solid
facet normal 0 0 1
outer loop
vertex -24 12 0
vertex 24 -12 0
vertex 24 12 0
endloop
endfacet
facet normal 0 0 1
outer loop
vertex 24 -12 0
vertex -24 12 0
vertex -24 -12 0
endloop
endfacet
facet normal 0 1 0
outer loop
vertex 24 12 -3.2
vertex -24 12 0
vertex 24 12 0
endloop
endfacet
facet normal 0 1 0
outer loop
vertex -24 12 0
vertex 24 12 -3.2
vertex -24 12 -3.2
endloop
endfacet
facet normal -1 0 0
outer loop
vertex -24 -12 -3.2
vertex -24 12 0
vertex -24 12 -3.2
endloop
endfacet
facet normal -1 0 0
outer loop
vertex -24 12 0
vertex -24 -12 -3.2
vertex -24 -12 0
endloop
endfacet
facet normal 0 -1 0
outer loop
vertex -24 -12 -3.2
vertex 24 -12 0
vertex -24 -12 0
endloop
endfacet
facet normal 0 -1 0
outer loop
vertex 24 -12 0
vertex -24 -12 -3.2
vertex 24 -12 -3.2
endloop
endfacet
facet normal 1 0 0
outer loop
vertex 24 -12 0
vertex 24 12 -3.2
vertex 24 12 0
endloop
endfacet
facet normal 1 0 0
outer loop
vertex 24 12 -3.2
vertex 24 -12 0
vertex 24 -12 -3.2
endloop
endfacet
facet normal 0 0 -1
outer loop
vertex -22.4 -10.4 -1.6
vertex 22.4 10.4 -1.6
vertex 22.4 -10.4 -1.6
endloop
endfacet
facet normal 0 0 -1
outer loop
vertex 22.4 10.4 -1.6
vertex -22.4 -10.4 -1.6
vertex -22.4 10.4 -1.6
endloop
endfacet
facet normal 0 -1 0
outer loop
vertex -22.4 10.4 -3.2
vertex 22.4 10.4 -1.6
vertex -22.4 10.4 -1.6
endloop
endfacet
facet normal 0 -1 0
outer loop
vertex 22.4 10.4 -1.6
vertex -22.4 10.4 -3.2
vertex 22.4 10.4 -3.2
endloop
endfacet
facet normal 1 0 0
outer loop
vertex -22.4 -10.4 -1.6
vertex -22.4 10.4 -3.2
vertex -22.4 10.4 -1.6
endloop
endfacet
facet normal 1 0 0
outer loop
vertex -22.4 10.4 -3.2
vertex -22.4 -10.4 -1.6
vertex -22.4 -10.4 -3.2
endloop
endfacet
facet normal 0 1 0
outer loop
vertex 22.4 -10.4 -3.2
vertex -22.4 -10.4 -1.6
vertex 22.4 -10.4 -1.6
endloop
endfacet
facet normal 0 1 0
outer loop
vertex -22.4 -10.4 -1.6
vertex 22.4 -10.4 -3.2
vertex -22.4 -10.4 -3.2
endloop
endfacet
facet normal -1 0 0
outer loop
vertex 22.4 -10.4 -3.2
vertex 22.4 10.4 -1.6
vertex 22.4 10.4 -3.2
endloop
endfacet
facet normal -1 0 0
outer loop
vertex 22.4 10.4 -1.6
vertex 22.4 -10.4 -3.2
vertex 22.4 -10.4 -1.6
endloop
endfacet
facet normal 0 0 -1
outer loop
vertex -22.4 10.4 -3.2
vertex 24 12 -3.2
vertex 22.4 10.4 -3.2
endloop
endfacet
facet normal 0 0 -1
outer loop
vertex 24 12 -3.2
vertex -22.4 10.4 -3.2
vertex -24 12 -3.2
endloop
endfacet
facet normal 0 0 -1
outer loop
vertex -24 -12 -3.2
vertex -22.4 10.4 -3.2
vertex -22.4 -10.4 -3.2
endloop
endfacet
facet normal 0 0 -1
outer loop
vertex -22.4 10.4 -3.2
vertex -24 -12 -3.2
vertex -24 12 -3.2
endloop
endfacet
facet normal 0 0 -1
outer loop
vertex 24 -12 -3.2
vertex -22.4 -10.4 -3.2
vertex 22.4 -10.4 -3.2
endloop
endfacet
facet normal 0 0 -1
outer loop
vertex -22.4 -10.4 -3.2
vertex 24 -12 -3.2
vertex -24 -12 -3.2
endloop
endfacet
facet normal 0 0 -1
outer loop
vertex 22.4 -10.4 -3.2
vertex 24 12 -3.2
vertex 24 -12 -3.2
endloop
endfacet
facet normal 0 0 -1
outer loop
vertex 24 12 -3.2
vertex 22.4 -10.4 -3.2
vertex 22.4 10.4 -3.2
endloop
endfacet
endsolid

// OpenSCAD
// file: ../p/box5.scad
use <../lib.scad>
function ldraw_lib__box5() = [
// 0 Box with 5 Faces and All Edges
// 0 Name: box5.dat
// 0 Author: James Jessiman
// 0 !LDRAW_ORG Primitive UPDATE 2012-01
// 0 !LICENSE Licensed under CC BY 2.0 and CC BY 4.0 : see CAreadme.txt
// 
// 0 BFC CERTIFY CCW
  [0,"BFC","CERTIFY"],
  [0,"BFC","CCW"],
// 
// 0 !HISTORY 2002-04-03 [sbliss] Modified for BFC compliance
// 0 !HISTORY 2002-04-25 [PTadmin] Official Update 2002-02
// 0 !HISTORY 2007-06-24 [PTadmin] Header formatted for Contributor Agreement
// 0 !HISTORY 2008-07-01 [PTadmin] Official Update 2008-01
// 0 !HISTORY 2012-02-16 [Philo] Changed to CCW
// 0 !HISTORY 2012-03-30 [PTadmin] Official Update 2012-01
// 
// 
// 2 24 1 1 1 -1 1 1
  [2,24,1,1,1,-1,1,1],
// 2 24 -1 1 1 -1 1 -1
  [2,24,-1,1,1,-1,1,-1],
// 2 24 -1 1 -1 1 1 -1
  [2,24,-1,1,-1,1,1,-1],
// 2 24 1 1 -1 1 1 1
  [2,24,1,1,-1,1,1,1],
// 2 24 1 0 1 -1 0 1
  [2,24,1,0,1,-1,0,1],
// 2 24 -1 0 1 -1 0 -1
  [2,24,-1,0,1,-1,0,-1],
// 2 24 -1 0 -1 1 0 -1
  [2,24,-1,0,-1,1,0,-1],
// 2 24 1 0 -1 1 0 1
  [2,24,1,0,-1,1,0,1],
// 2 24 1 0 1 1 1 1
  [2,24,1,0,1,1,1,1],
// 2 24 -1 0 1 -1 1 1
  [2,24,-1,0,1,-1,1,1],
// 2 24 1 0 -1 1 1 -1
  [2,24,1,0,-1,1,1,-1],
// 2 24 -1 0 -1 -1 1 -1
  [2,24,-1,0,-1,-1,1,-1],
// 4 16 -1 1 1 1 1 1 1 1 -1 -1 1 -1
  [4,16,-1,1,1,1,1,1,1,1,-1,-1,1,-1],
// 4 16 -1 1 1 -1 0 1 1 0 1 1 1 1
  [4,16,-1,1,1,-1,0,1,1,0,1,1,1,1],
// 4 16 -1 1 -1 -1 0 -1 -1 0 1 -1 1 1
  [4,16,-1,1,-1,-1,0,-1,-1,0,1,-1,1,1],
// 4 16 1 1 -1 1 0 -1 -1 0 -1 -1 1 -1
  [4,16,1,1,-1,1,0,-1,-1,0,-1,-1,1,-1],
// 4 16 1 1 1 1 0 1 1 0 -1 1 1 -1
  [4,16,1,1,1,1,0,1,1,0,-1,1,1,-1],
];
makepoly(ldraw_lib__box5(), line=0.2);
// main file
use <../lib.scad>
use <../p/box5.scad>
function ldraw_lib__6934() = [
// 0 Tile  3 x  6
// 0 Name: 6934.dat
// 0 Author: Tore Eriksson [Tore_Eriksson]
// 0 !LDRAW_ORG Part UPDATE 2011-02
// 0 !LICENSE Licensed under CC BY 2.0 and CC BY 4.0 : see CAreadme.txt
// 
// 0 BFC CERTIFY CCW
  [0,"BFC","CERTIFY"],
  [0,"BFC","CCW"],
// 
// 0 !KEYWORDS Scala
// 
// 0 !HISTORY 1997-12-05 [PTadmin] Official Update 1997-17
// 0 !HISTORY 2007-07-18 [PTadmin] Header formatted for Contributor Agreement
// 0 !HISTORY 2008-07-01 [PTadmin] Official Update 2008-01
// 0 !HISTORY 2008-07-07 [guyvivan] Made BFC compliant (2004-11-16)
// 0 !HISTORY 2009-09-03 [PTadmin] Official Update 2009-02
// 0 !HISTORY 2011-10-31 [cwdee] Description change
// 0 !HISTORY 2011-12-29 [PTadmin] Official Update 2011-02
// 
// 
// 1 16 0 8 0 60 0 0 0 -8 0 0 0 30 box5.dat
  [1,16,0,8,0,60,0,0,0,-8,0,0,0,30, ldraw_lib__box5()],
// 0 BFC INVERTNEXT
  [0,"BFC","INVERTNEXT"],
// 1 16 0 8 0 56 0 0 0 -4 0 0 0 26 box5.dat
  [1,16,0,8,0,56,0,0,0,-4,0,0,0,26, ldraw_lib__box5()],
// 4 16 -60 8 30 60 8 30 56 8 26 -56 8 26
  [4,16,-60,8,30,60,8,30,56,8,26,-56,8,26],
// 4 16 -60 8 -30 -60 8 30 -56 8 26 -56 8 -26
  [4,16,-60,8,-30,-60,8,30,-56,8,26,-56,8,-26],
// 4 16 60 8 -30 -60 8 -30 -56 8 -26 56 8 -26
  [4,16,60,8,-30,-60,8,-30,-56,8,-26,56,8,-26],
// 4 16 60 8 30 60 8 -30 56 8 -26 56 8 26
  [4,16,60,8,30,60,8,-30,56,8,-26,56,8,26],
// 0
];
makepoly(ldraw_lib__6934(), line=0.2);
